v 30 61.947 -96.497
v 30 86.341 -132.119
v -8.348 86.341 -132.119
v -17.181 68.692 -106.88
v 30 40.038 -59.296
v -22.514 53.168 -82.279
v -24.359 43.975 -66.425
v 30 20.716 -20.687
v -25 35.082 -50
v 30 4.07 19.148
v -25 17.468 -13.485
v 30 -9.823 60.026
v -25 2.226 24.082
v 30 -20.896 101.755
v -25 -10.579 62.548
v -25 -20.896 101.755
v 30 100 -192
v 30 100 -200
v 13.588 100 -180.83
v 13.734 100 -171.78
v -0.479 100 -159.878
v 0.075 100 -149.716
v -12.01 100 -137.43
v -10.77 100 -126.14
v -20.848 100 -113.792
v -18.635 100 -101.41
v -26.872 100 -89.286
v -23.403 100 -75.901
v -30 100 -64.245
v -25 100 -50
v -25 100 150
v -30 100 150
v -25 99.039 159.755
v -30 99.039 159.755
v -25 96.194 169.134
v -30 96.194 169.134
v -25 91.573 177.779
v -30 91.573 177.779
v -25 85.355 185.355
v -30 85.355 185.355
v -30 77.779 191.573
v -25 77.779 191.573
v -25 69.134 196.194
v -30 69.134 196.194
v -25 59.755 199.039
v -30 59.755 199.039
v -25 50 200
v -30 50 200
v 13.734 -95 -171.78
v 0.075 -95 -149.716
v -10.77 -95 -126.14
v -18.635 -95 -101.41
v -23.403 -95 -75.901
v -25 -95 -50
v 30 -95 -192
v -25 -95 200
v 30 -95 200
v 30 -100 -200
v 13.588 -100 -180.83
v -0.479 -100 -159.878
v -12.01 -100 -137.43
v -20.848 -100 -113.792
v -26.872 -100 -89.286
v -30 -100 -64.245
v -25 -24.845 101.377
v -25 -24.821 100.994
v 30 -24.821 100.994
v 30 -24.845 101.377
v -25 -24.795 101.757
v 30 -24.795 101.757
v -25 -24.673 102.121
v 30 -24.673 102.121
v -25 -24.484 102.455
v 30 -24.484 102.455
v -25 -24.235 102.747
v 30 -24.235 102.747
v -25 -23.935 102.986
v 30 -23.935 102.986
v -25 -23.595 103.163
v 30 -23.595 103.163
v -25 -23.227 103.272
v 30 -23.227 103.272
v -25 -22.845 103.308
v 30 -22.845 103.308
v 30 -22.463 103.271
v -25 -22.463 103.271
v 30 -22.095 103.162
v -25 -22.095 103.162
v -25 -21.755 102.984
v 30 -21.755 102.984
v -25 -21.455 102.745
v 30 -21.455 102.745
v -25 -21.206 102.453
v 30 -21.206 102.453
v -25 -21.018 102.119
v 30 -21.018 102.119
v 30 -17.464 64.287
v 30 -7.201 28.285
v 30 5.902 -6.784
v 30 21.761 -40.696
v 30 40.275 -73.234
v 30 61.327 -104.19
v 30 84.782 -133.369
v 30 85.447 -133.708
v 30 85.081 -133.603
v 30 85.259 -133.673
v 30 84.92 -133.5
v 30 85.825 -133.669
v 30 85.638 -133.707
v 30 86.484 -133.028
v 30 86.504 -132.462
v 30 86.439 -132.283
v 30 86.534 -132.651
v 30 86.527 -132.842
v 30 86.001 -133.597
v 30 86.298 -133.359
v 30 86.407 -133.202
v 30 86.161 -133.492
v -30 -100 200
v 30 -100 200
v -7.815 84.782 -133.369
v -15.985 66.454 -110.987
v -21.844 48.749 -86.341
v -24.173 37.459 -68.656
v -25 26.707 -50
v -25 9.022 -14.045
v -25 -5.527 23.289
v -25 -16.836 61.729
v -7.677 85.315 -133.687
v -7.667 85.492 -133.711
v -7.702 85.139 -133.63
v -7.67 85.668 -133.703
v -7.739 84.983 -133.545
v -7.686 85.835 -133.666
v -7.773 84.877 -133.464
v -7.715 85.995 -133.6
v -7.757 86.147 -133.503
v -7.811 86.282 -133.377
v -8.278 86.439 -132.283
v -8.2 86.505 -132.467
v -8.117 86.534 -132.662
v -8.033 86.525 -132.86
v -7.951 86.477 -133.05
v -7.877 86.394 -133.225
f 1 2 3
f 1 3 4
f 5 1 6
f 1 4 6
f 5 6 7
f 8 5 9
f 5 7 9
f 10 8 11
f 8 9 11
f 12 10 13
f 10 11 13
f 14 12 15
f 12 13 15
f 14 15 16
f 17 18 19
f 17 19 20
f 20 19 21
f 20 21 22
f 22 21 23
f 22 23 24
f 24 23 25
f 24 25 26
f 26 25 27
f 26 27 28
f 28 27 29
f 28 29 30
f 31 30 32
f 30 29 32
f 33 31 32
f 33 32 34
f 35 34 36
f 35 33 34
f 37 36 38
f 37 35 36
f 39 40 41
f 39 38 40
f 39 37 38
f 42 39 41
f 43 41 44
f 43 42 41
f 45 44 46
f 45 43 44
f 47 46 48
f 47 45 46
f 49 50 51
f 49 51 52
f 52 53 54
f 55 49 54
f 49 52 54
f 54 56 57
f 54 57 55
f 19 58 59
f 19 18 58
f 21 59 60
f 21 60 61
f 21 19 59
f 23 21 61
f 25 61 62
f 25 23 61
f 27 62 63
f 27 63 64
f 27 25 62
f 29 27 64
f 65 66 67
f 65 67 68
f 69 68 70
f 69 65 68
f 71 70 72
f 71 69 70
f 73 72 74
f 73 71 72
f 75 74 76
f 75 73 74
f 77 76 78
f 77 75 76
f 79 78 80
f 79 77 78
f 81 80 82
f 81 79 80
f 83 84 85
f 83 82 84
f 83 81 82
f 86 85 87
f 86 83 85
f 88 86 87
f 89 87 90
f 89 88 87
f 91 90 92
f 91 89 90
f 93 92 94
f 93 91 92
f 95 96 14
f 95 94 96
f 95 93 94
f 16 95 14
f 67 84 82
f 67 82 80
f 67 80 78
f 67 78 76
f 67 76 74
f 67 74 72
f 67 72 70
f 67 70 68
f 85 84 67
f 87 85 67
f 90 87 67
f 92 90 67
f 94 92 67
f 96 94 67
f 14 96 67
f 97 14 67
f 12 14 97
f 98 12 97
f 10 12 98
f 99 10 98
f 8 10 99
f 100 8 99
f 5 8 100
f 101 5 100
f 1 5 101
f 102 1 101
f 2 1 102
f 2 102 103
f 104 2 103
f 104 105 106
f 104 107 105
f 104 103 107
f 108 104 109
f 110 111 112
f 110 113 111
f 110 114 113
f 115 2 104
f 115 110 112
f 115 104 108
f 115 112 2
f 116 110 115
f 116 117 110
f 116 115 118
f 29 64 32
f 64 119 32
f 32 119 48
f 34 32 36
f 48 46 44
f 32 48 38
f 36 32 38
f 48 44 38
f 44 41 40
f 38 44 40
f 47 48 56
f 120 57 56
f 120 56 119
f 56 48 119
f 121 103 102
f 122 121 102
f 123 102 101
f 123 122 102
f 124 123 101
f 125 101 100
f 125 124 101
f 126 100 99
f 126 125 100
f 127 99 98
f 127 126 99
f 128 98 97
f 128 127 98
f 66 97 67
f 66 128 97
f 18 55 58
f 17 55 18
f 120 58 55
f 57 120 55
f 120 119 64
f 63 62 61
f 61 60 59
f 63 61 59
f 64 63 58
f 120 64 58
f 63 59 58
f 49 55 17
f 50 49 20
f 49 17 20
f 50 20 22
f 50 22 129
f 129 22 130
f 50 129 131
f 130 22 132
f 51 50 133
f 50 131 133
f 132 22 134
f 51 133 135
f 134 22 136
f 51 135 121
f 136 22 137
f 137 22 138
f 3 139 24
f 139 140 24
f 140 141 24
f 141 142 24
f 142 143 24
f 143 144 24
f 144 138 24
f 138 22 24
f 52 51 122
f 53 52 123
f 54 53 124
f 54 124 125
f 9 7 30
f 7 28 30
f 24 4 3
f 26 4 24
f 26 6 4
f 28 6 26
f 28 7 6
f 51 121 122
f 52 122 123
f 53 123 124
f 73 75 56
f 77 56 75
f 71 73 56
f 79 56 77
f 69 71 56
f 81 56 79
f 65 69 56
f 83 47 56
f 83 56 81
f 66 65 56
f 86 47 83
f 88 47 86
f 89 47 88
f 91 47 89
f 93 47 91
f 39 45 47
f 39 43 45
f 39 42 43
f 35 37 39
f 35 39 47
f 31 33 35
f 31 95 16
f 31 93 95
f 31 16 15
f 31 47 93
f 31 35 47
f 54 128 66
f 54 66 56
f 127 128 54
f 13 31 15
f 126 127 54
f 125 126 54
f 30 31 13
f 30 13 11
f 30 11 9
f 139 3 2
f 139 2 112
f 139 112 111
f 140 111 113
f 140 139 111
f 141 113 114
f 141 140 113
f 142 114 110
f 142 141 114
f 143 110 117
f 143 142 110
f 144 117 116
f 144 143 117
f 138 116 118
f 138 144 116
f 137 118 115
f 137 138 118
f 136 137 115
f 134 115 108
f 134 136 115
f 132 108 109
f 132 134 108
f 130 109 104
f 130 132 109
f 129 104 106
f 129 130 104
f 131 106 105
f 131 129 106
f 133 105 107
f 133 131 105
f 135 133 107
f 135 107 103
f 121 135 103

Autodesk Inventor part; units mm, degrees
ref_plane "YZ Plane" through (0, 0, 0) normal (1, 0, 0) x (0, 1, 0)
ref_plane "XZ Plane" through (0, 0, 0) normal (0, 1, 0) x (-1, 0, 0)
ref_plane "XY Plane" through (0, 0, 0) normal (0, 0, 1) x (1, 0, 0)
sketch "スケッチ1" plane through (0, 0, 0) normal (1, 0, 0) x (0, 1, 0)
  line L0 (100, 200) -> (-100, 200)
  line L1 (-100, 200) -> (-100, -200)
  line L2 (-100, -200) -> (100, -200)
  line L3 (100, -200) -> (100, 200)
  line L4 (-140, 0) -> (140, 0) projected
  line L5 (0, -280) -> (0, 280) projected
  point P0 (0, 0)
  point P1 (100, 0)
  point P2 (0, 200)
  dimension "d2" = 200
  dimension "d3" = 400
extrude "押し出し1" add sketch "スケッチ1" along normal mid plane 60
sketch "スケッチ3" plane through (-30, 100, 200) normal (0, 1, 0) x (1, 0, 0)
  line L0 (0, 0) -> (60, 0) projected
  line L1 (60, 0) -> (5, 0)
  line L2 (60, 392) -> (60, 0)
  line L3 (60, 400) -> (60, 0) projected
  line L4 (5, 0) -> (5, 250)
  arc A0 (60, 392) -> (5, 250) centre (215.8091, 250) ccw
  line L5 (0, 0) -> (0, 400) projected
  line L6 (0, 400) -> (60, 400) projected
  arc A1 (60, 400) -> (0, 264.2446) centre (215.8091, 250) ccw
  dimension "d16" = 5
  dimension "d18" = 250
  dimension "d21" = 8
extrude "押し出し2" cut sketch "スケッチ3" against normal through all contours L4 A0 L2 L0 | L5 L6 A1
sketch "スケッチ7" plane through (-25, 100, 200) normal (1, 0, 0) x (0, 0, -1)
  arc A0 (50, -130) -> (350, 0) centre (-43.1737, 496.1701) ccw
  arc A1 (50, -130) -> (350, 0) centre (25.3027, 338.1476) ccw
  line L0 (50, -130) -> (350, 0)
  line L1 (0, -200) -> (0, 0) projected
  line L2 (0, 0) -> (250, 0) projected
  line L3 (400, -200) -> (400, 0) projected
  dimension "d30" = 50
  dimension "d31" = 130
  dimension "d38" = 50
extrude "押し出し5" add sketch "スケッチ7" along normal blind 55 contours A0 A1
sketch "スケッチ8" plane through (0, 0, 0) normal (0, 1, 0) x (-1, 0, 0)
  line L0 (-30, -200) -> (-30, -192) projected
  line L1 (-30, -200) -> (30, -200)
  line L2 (30, 200) -> (30, -64.2446) projected
  arc A0 (-30, -200) -> (30, -64.2446) centre (-185.8091, -50) ccw projected
  arc A1 (-30, -200) -> (-30, -200) centre (-53.5814, -108.4409) ccw
  line L3 (30, -200) -> (30, -64.2446)
  point P0 (0, 0)
extrude "押し出し6" cut sketch "スケッチ8" along normal through all contours A1 L3 L1 | A0 L3 A1
fillet "フィレット2" radius 1 1 edges at (15.1138, 100, -150)
fillet "フィレット2" radius 2 1 edges at (2.5, -30, 150)
sketch "スケッチ10" plane through (-30, -100, -64.2446) normal (0, -1, 0) x (1, 0, 0)
  line L0 (0, 264.2446) -> (5, 264.2446) projected
  line L1 (5, 264.2446) -> (60, 264.2446)
  arc A0 (5, 14.2446) -> (60, -127.7554) centre (215.8091, 14.2446) ccw projected
  line L2 (60, 264.2446) -> (60, -127.7554)
  line L3 (5, 14.2446) -> (5, 264.2446) projected
  line L4 (5, 264.2446) -> (5, 14.2446)
  line L5 (0, 264.2446) -> (0, 0) projected
  point P0 (30, 64.2446)
extrude "押し出し7" add sketch "スケッチ10" against normal blind 5
fillet "フィレット3" radius 50 1 edges at (-27.5, 100, 200)
properties part number "type8_end_plate" material "CFRP"
